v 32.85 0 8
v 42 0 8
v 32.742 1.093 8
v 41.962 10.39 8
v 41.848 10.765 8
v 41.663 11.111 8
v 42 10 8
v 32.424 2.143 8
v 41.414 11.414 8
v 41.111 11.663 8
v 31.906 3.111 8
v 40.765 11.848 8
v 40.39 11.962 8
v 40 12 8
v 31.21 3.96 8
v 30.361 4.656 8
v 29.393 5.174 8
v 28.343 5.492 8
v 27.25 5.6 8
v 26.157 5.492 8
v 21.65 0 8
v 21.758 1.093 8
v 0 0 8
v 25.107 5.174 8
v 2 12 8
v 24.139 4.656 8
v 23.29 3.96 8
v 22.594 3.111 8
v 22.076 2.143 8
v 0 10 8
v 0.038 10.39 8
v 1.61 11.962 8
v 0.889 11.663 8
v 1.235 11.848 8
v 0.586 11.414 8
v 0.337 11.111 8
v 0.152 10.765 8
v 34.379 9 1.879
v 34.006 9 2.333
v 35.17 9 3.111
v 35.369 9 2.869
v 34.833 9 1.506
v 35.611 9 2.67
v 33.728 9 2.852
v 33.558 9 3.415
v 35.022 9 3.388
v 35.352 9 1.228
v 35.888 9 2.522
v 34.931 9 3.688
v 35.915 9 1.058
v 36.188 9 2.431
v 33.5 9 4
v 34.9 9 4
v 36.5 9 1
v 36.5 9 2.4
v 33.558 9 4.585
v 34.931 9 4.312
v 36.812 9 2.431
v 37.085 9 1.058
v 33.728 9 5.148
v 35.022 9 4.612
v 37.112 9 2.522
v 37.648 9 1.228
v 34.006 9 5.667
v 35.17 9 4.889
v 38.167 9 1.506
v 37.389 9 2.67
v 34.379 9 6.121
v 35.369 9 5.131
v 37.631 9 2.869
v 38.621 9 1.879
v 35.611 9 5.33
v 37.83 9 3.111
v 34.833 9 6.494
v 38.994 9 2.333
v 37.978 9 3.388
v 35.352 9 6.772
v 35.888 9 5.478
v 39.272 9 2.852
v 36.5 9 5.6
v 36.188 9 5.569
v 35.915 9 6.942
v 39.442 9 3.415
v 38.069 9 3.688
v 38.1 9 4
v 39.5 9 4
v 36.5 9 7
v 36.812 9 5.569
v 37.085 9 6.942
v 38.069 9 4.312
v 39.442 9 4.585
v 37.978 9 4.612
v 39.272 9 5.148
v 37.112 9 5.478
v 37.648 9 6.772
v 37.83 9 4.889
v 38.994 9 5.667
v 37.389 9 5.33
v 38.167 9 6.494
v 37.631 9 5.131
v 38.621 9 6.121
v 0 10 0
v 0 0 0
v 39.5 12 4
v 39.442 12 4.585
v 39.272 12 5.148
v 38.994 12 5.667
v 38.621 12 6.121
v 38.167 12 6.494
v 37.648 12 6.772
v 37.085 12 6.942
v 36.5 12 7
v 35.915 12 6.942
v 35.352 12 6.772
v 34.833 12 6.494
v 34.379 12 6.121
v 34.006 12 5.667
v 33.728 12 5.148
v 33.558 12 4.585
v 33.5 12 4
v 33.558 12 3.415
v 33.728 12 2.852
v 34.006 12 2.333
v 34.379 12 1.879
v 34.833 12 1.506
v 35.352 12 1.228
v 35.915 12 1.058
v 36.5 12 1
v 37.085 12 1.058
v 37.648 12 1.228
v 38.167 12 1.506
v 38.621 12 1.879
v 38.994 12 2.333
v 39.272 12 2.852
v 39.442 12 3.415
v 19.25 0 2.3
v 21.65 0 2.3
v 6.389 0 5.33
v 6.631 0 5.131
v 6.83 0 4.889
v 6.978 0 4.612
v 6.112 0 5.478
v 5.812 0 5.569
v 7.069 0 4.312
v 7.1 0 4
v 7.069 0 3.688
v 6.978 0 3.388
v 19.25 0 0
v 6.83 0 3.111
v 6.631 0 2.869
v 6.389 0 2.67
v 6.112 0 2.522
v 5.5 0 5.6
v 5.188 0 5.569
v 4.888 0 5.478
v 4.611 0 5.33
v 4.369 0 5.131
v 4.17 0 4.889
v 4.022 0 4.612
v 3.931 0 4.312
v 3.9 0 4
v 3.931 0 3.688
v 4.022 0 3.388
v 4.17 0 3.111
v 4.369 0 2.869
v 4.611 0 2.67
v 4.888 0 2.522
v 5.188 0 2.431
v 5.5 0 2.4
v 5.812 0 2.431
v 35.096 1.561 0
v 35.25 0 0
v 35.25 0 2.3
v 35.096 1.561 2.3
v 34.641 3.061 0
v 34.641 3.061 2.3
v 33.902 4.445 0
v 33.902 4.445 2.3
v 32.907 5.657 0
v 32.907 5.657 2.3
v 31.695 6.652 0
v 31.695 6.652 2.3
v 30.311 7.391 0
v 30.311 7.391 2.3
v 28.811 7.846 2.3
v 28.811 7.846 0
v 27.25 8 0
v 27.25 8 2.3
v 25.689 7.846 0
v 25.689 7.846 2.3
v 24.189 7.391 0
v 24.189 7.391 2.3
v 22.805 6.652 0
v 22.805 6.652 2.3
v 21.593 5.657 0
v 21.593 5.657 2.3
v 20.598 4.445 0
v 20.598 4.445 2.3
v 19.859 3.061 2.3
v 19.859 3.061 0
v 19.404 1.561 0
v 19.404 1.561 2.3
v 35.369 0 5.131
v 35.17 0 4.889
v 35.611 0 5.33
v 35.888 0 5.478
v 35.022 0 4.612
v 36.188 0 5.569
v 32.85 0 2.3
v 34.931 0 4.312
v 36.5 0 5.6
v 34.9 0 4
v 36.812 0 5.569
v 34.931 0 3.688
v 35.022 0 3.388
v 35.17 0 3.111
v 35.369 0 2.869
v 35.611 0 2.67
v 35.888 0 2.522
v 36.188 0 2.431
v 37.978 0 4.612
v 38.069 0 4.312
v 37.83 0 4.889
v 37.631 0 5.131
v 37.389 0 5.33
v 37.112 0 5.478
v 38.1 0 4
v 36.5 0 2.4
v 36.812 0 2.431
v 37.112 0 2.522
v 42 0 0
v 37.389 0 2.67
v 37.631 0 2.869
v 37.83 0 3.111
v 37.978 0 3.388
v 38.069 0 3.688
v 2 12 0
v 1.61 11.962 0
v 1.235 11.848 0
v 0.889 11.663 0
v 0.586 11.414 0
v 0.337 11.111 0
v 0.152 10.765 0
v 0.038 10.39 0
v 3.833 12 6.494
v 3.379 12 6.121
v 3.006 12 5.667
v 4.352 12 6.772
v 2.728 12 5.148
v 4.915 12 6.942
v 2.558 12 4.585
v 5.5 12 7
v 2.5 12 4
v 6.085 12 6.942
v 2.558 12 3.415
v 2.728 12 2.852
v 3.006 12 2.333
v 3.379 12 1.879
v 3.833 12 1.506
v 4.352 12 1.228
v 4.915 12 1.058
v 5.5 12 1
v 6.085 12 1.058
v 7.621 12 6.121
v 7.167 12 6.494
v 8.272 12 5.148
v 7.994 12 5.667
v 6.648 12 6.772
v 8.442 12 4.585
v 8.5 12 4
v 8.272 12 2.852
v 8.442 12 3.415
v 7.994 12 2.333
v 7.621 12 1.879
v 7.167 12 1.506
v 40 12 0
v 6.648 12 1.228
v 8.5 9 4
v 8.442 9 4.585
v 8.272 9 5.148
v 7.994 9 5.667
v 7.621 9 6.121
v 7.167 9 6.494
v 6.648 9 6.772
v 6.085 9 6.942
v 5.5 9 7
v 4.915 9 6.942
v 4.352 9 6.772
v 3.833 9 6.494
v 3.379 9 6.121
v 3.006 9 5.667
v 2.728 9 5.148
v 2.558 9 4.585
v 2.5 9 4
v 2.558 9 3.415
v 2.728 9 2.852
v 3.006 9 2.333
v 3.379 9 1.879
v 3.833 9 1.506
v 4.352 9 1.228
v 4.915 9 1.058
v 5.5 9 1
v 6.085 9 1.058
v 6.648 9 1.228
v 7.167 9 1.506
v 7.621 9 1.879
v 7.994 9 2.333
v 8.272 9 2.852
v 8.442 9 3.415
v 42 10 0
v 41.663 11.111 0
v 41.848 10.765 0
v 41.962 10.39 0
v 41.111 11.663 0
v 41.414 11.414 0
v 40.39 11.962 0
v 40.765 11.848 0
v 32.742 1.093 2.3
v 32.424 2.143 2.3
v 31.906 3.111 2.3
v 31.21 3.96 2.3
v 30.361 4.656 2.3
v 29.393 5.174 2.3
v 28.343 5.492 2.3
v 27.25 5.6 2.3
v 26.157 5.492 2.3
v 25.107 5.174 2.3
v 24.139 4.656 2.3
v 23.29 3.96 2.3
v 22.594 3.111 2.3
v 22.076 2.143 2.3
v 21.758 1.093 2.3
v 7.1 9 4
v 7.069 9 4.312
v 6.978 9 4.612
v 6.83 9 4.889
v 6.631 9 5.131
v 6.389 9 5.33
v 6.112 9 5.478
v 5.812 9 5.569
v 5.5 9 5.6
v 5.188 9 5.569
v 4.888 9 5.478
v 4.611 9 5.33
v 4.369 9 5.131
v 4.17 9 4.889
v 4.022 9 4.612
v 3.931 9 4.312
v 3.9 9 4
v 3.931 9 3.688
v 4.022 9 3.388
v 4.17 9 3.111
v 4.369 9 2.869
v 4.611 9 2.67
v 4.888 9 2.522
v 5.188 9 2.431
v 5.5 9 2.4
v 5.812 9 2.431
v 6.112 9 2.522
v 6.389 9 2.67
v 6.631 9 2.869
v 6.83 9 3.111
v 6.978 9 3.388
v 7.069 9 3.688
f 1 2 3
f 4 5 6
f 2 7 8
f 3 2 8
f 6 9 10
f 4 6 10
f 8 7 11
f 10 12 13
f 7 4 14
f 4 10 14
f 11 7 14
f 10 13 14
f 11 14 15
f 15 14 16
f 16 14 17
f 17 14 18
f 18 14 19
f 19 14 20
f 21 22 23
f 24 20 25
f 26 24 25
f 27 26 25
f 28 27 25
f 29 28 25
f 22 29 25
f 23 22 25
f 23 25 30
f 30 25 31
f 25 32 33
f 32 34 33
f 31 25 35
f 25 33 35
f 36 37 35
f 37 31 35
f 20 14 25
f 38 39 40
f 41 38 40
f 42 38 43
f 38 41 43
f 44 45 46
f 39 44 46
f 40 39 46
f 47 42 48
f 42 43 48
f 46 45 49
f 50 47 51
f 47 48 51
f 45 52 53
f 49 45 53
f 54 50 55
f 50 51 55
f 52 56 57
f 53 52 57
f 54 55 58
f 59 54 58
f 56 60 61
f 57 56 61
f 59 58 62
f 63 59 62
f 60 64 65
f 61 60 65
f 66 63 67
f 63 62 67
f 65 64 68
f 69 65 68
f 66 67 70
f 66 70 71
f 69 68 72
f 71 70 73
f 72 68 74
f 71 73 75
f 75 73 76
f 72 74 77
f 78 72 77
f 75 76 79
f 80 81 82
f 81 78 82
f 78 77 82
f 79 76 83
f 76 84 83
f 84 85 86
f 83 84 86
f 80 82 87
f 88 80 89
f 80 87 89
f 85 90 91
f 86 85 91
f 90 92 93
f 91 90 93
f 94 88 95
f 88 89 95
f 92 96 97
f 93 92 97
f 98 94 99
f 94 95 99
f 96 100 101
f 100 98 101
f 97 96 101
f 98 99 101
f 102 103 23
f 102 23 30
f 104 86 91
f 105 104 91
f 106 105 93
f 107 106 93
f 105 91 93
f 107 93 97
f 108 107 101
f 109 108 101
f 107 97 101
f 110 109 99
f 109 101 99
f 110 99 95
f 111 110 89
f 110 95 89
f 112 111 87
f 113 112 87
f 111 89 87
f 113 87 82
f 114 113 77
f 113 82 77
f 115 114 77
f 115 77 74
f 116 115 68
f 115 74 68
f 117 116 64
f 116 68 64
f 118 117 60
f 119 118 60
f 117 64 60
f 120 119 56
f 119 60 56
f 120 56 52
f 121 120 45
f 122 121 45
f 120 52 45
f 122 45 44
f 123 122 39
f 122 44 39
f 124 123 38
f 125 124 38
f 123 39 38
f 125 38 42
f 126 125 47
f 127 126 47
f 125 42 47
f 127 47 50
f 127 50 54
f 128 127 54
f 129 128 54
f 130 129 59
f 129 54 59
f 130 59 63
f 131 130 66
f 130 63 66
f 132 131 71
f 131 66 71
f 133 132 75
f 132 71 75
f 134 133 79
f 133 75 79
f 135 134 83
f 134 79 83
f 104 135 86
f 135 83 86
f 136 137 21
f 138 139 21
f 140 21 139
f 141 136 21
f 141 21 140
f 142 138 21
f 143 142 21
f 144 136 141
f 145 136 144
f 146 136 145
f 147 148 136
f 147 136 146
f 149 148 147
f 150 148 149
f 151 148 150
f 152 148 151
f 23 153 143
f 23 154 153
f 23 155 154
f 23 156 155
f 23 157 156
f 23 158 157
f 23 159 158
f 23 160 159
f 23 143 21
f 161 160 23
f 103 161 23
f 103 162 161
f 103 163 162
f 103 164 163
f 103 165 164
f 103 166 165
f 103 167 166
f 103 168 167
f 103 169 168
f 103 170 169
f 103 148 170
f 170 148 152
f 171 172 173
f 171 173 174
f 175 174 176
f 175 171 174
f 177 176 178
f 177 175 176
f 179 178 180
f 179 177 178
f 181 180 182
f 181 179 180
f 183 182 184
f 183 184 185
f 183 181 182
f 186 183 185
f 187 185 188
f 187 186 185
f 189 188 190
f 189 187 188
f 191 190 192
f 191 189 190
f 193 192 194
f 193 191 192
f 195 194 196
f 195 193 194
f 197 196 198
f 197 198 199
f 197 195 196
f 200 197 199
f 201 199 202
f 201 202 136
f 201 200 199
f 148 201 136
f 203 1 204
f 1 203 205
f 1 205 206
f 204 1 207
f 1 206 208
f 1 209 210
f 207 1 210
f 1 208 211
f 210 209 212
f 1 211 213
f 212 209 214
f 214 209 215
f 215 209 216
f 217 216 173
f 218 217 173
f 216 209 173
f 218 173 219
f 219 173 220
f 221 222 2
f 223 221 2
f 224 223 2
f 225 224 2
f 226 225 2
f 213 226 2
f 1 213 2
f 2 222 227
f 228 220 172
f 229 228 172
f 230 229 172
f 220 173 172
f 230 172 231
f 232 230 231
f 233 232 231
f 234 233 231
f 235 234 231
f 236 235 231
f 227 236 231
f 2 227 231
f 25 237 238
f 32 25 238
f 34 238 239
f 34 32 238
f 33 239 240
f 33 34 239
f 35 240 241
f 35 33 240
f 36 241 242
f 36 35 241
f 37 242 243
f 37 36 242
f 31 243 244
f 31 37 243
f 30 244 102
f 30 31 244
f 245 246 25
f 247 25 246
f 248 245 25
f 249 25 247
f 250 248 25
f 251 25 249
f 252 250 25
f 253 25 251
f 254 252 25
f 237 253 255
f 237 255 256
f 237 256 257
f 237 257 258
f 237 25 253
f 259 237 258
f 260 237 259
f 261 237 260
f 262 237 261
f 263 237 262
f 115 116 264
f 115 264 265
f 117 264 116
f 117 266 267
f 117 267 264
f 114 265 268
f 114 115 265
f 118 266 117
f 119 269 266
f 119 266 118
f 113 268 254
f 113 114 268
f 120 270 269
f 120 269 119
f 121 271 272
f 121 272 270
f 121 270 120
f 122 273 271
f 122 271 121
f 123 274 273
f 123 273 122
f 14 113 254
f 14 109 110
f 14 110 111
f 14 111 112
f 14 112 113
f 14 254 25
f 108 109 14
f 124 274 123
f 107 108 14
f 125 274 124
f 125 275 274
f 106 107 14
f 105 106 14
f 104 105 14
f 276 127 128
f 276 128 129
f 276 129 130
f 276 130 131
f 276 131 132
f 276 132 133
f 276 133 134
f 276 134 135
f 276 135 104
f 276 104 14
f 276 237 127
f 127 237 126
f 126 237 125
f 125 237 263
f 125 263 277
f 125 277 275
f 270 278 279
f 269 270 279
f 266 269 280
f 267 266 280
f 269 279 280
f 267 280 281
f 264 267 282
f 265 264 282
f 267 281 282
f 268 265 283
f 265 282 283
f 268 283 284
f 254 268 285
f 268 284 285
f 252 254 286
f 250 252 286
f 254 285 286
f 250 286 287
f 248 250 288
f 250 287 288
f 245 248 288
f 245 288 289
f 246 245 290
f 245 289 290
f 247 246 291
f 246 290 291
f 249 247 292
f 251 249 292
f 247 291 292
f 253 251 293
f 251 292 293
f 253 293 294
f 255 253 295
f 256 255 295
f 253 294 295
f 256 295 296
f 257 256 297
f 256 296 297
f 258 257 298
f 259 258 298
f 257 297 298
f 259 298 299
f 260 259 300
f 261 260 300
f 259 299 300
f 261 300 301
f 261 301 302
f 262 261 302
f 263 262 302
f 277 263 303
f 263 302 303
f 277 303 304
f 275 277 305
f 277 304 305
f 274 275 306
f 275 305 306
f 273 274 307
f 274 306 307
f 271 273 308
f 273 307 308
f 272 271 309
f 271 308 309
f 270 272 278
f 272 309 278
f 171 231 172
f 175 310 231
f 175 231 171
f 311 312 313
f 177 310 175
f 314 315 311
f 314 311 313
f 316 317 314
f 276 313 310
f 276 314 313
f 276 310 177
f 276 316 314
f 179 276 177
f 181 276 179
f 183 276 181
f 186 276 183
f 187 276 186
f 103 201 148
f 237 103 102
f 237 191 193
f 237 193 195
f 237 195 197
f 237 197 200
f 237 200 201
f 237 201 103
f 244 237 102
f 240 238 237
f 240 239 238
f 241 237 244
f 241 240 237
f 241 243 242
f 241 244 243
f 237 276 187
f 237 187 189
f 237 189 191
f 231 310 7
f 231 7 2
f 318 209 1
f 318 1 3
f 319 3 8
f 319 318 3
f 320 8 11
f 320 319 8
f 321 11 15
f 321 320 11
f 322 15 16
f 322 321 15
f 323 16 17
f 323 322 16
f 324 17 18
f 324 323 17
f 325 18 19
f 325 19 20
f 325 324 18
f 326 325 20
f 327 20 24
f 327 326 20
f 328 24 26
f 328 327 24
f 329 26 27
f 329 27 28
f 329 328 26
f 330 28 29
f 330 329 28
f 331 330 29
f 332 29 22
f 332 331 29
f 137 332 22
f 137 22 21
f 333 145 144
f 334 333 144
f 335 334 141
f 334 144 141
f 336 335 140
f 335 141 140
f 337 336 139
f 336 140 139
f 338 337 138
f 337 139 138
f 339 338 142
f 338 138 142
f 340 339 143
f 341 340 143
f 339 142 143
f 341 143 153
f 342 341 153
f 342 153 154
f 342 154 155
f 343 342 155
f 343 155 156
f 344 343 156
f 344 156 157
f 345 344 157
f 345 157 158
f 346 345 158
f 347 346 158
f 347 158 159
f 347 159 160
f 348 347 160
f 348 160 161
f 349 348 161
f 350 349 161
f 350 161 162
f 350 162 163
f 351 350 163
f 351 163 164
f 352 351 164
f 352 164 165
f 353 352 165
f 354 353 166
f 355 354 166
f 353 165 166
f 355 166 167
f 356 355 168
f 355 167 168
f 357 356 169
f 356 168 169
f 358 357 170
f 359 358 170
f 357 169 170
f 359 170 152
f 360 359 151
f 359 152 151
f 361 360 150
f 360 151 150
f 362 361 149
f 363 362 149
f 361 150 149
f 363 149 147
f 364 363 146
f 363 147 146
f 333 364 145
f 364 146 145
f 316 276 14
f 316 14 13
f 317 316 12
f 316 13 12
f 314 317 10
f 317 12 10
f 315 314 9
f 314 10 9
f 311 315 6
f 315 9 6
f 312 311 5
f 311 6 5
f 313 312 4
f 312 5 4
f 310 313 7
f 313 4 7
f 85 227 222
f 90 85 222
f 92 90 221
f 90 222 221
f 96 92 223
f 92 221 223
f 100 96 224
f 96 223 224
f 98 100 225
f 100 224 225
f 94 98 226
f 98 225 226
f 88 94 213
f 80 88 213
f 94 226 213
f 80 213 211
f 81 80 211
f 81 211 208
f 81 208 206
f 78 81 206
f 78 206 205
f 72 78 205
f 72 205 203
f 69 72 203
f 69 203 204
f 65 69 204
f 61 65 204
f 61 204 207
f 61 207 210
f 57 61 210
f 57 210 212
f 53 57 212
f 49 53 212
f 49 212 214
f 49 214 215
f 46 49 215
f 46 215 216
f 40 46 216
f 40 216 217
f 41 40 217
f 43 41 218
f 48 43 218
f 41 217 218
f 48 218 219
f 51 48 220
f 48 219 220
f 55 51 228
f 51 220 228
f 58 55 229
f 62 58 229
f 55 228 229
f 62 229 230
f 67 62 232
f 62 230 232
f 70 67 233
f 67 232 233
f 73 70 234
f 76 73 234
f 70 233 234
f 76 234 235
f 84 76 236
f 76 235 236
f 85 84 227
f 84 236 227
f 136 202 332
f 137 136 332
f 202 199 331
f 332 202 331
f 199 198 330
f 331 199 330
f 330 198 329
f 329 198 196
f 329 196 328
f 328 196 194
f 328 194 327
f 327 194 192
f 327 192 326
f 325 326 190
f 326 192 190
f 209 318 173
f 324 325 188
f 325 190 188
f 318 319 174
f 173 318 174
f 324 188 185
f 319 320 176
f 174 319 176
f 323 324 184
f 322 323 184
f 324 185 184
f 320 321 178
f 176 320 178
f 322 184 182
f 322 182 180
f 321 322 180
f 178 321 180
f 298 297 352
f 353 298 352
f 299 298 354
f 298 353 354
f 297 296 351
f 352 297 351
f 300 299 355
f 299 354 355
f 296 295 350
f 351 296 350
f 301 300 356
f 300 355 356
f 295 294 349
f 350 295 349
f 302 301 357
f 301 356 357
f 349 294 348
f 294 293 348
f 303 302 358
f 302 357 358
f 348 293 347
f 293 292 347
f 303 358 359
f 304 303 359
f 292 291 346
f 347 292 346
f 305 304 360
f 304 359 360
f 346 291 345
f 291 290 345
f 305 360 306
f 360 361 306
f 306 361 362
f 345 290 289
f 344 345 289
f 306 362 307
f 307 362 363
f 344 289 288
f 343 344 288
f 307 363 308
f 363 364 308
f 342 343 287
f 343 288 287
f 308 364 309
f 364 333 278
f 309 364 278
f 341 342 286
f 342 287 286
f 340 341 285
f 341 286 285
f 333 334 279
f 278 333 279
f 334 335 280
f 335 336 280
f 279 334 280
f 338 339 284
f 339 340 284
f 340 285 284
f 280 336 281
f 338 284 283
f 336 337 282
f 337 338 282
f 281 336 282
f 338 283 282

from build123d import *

# Parameters (mm, degrees)
SKETCH007_R  = 1.6
PAD007_DEPTH = 12
SKETCH005_R  = 8
PAD005_DEPTH = 2.3
SKETCH008_R  = 3
PAD008_DEPTH = 3
PAD_DEPTH    = 8
FILLET_R     = 2


with BuildPart() as hotendmount02:
    # Sketch007 → Pad007 (new body)
    with BuildSketch(Plane.XZ):
        with Locations((5.5, 4)):
            Circle(SKETCH007_R)
        with Locations((36.5, 4)):
            Circle(SKETCH007_R)
    extrude(amount=-PAD007_DEPTH)


with BuildPart() as hotendmount:
    # Sketch005 → Pad005 (new body)
    with BuildSketch(Plane.XY):
        with Locations((27.25, 0)):
            Circle(SKETCH005_R)
    extrude(amount=PAD005_DEPTH)


with BuildPart() as cutblock:
    # Sketch008 → Pad008 (new body)
    with BuildSketch(Plane.XZ.offset(-9)):
        with Locations((5.5, 4)):
            Circle(SKETCH008_R)
        with Locations((36.5, 4)):
            Circle(SKETCH008_R)
    extrude(amount=-PAD008_DEPTH)

    # Fusion: union HotEndMount02, HotEndMount
    add(hotendmount02.part)
    add(hotendmount.part)


with BuildPart() as fillet_body:
    # Sketch → Pad (new body)
    with BuildSketch(Plane.XY):
        with BuildLine():
            Line((0, 12), (42, 12))
            Line((42, 12), (42, 0))
            Line((32.85, 0), (42, 0))
            ThreePointArc((32.85, 0), (27.25, 5.6), (21.65, 0))
            Line((21.65, 0), (0, 0))
            Line((0, 0), (0, 12))
        make_face()
    extrude(amount=PAD_DEPTH)

    # Cut: cut CutBlock
    add(cutblock.part, mode=Mode.SUBTRACT)

    # Fillet
    fillet_edges = [fillet_body.edges().sort_by_distance(p)[0] for p in [
        (42, 12, 4),
        (0, 12, 4),
    ]]
    fillet(fillet_edges, radius=FILLET_R)


solid = fillet_body.part
